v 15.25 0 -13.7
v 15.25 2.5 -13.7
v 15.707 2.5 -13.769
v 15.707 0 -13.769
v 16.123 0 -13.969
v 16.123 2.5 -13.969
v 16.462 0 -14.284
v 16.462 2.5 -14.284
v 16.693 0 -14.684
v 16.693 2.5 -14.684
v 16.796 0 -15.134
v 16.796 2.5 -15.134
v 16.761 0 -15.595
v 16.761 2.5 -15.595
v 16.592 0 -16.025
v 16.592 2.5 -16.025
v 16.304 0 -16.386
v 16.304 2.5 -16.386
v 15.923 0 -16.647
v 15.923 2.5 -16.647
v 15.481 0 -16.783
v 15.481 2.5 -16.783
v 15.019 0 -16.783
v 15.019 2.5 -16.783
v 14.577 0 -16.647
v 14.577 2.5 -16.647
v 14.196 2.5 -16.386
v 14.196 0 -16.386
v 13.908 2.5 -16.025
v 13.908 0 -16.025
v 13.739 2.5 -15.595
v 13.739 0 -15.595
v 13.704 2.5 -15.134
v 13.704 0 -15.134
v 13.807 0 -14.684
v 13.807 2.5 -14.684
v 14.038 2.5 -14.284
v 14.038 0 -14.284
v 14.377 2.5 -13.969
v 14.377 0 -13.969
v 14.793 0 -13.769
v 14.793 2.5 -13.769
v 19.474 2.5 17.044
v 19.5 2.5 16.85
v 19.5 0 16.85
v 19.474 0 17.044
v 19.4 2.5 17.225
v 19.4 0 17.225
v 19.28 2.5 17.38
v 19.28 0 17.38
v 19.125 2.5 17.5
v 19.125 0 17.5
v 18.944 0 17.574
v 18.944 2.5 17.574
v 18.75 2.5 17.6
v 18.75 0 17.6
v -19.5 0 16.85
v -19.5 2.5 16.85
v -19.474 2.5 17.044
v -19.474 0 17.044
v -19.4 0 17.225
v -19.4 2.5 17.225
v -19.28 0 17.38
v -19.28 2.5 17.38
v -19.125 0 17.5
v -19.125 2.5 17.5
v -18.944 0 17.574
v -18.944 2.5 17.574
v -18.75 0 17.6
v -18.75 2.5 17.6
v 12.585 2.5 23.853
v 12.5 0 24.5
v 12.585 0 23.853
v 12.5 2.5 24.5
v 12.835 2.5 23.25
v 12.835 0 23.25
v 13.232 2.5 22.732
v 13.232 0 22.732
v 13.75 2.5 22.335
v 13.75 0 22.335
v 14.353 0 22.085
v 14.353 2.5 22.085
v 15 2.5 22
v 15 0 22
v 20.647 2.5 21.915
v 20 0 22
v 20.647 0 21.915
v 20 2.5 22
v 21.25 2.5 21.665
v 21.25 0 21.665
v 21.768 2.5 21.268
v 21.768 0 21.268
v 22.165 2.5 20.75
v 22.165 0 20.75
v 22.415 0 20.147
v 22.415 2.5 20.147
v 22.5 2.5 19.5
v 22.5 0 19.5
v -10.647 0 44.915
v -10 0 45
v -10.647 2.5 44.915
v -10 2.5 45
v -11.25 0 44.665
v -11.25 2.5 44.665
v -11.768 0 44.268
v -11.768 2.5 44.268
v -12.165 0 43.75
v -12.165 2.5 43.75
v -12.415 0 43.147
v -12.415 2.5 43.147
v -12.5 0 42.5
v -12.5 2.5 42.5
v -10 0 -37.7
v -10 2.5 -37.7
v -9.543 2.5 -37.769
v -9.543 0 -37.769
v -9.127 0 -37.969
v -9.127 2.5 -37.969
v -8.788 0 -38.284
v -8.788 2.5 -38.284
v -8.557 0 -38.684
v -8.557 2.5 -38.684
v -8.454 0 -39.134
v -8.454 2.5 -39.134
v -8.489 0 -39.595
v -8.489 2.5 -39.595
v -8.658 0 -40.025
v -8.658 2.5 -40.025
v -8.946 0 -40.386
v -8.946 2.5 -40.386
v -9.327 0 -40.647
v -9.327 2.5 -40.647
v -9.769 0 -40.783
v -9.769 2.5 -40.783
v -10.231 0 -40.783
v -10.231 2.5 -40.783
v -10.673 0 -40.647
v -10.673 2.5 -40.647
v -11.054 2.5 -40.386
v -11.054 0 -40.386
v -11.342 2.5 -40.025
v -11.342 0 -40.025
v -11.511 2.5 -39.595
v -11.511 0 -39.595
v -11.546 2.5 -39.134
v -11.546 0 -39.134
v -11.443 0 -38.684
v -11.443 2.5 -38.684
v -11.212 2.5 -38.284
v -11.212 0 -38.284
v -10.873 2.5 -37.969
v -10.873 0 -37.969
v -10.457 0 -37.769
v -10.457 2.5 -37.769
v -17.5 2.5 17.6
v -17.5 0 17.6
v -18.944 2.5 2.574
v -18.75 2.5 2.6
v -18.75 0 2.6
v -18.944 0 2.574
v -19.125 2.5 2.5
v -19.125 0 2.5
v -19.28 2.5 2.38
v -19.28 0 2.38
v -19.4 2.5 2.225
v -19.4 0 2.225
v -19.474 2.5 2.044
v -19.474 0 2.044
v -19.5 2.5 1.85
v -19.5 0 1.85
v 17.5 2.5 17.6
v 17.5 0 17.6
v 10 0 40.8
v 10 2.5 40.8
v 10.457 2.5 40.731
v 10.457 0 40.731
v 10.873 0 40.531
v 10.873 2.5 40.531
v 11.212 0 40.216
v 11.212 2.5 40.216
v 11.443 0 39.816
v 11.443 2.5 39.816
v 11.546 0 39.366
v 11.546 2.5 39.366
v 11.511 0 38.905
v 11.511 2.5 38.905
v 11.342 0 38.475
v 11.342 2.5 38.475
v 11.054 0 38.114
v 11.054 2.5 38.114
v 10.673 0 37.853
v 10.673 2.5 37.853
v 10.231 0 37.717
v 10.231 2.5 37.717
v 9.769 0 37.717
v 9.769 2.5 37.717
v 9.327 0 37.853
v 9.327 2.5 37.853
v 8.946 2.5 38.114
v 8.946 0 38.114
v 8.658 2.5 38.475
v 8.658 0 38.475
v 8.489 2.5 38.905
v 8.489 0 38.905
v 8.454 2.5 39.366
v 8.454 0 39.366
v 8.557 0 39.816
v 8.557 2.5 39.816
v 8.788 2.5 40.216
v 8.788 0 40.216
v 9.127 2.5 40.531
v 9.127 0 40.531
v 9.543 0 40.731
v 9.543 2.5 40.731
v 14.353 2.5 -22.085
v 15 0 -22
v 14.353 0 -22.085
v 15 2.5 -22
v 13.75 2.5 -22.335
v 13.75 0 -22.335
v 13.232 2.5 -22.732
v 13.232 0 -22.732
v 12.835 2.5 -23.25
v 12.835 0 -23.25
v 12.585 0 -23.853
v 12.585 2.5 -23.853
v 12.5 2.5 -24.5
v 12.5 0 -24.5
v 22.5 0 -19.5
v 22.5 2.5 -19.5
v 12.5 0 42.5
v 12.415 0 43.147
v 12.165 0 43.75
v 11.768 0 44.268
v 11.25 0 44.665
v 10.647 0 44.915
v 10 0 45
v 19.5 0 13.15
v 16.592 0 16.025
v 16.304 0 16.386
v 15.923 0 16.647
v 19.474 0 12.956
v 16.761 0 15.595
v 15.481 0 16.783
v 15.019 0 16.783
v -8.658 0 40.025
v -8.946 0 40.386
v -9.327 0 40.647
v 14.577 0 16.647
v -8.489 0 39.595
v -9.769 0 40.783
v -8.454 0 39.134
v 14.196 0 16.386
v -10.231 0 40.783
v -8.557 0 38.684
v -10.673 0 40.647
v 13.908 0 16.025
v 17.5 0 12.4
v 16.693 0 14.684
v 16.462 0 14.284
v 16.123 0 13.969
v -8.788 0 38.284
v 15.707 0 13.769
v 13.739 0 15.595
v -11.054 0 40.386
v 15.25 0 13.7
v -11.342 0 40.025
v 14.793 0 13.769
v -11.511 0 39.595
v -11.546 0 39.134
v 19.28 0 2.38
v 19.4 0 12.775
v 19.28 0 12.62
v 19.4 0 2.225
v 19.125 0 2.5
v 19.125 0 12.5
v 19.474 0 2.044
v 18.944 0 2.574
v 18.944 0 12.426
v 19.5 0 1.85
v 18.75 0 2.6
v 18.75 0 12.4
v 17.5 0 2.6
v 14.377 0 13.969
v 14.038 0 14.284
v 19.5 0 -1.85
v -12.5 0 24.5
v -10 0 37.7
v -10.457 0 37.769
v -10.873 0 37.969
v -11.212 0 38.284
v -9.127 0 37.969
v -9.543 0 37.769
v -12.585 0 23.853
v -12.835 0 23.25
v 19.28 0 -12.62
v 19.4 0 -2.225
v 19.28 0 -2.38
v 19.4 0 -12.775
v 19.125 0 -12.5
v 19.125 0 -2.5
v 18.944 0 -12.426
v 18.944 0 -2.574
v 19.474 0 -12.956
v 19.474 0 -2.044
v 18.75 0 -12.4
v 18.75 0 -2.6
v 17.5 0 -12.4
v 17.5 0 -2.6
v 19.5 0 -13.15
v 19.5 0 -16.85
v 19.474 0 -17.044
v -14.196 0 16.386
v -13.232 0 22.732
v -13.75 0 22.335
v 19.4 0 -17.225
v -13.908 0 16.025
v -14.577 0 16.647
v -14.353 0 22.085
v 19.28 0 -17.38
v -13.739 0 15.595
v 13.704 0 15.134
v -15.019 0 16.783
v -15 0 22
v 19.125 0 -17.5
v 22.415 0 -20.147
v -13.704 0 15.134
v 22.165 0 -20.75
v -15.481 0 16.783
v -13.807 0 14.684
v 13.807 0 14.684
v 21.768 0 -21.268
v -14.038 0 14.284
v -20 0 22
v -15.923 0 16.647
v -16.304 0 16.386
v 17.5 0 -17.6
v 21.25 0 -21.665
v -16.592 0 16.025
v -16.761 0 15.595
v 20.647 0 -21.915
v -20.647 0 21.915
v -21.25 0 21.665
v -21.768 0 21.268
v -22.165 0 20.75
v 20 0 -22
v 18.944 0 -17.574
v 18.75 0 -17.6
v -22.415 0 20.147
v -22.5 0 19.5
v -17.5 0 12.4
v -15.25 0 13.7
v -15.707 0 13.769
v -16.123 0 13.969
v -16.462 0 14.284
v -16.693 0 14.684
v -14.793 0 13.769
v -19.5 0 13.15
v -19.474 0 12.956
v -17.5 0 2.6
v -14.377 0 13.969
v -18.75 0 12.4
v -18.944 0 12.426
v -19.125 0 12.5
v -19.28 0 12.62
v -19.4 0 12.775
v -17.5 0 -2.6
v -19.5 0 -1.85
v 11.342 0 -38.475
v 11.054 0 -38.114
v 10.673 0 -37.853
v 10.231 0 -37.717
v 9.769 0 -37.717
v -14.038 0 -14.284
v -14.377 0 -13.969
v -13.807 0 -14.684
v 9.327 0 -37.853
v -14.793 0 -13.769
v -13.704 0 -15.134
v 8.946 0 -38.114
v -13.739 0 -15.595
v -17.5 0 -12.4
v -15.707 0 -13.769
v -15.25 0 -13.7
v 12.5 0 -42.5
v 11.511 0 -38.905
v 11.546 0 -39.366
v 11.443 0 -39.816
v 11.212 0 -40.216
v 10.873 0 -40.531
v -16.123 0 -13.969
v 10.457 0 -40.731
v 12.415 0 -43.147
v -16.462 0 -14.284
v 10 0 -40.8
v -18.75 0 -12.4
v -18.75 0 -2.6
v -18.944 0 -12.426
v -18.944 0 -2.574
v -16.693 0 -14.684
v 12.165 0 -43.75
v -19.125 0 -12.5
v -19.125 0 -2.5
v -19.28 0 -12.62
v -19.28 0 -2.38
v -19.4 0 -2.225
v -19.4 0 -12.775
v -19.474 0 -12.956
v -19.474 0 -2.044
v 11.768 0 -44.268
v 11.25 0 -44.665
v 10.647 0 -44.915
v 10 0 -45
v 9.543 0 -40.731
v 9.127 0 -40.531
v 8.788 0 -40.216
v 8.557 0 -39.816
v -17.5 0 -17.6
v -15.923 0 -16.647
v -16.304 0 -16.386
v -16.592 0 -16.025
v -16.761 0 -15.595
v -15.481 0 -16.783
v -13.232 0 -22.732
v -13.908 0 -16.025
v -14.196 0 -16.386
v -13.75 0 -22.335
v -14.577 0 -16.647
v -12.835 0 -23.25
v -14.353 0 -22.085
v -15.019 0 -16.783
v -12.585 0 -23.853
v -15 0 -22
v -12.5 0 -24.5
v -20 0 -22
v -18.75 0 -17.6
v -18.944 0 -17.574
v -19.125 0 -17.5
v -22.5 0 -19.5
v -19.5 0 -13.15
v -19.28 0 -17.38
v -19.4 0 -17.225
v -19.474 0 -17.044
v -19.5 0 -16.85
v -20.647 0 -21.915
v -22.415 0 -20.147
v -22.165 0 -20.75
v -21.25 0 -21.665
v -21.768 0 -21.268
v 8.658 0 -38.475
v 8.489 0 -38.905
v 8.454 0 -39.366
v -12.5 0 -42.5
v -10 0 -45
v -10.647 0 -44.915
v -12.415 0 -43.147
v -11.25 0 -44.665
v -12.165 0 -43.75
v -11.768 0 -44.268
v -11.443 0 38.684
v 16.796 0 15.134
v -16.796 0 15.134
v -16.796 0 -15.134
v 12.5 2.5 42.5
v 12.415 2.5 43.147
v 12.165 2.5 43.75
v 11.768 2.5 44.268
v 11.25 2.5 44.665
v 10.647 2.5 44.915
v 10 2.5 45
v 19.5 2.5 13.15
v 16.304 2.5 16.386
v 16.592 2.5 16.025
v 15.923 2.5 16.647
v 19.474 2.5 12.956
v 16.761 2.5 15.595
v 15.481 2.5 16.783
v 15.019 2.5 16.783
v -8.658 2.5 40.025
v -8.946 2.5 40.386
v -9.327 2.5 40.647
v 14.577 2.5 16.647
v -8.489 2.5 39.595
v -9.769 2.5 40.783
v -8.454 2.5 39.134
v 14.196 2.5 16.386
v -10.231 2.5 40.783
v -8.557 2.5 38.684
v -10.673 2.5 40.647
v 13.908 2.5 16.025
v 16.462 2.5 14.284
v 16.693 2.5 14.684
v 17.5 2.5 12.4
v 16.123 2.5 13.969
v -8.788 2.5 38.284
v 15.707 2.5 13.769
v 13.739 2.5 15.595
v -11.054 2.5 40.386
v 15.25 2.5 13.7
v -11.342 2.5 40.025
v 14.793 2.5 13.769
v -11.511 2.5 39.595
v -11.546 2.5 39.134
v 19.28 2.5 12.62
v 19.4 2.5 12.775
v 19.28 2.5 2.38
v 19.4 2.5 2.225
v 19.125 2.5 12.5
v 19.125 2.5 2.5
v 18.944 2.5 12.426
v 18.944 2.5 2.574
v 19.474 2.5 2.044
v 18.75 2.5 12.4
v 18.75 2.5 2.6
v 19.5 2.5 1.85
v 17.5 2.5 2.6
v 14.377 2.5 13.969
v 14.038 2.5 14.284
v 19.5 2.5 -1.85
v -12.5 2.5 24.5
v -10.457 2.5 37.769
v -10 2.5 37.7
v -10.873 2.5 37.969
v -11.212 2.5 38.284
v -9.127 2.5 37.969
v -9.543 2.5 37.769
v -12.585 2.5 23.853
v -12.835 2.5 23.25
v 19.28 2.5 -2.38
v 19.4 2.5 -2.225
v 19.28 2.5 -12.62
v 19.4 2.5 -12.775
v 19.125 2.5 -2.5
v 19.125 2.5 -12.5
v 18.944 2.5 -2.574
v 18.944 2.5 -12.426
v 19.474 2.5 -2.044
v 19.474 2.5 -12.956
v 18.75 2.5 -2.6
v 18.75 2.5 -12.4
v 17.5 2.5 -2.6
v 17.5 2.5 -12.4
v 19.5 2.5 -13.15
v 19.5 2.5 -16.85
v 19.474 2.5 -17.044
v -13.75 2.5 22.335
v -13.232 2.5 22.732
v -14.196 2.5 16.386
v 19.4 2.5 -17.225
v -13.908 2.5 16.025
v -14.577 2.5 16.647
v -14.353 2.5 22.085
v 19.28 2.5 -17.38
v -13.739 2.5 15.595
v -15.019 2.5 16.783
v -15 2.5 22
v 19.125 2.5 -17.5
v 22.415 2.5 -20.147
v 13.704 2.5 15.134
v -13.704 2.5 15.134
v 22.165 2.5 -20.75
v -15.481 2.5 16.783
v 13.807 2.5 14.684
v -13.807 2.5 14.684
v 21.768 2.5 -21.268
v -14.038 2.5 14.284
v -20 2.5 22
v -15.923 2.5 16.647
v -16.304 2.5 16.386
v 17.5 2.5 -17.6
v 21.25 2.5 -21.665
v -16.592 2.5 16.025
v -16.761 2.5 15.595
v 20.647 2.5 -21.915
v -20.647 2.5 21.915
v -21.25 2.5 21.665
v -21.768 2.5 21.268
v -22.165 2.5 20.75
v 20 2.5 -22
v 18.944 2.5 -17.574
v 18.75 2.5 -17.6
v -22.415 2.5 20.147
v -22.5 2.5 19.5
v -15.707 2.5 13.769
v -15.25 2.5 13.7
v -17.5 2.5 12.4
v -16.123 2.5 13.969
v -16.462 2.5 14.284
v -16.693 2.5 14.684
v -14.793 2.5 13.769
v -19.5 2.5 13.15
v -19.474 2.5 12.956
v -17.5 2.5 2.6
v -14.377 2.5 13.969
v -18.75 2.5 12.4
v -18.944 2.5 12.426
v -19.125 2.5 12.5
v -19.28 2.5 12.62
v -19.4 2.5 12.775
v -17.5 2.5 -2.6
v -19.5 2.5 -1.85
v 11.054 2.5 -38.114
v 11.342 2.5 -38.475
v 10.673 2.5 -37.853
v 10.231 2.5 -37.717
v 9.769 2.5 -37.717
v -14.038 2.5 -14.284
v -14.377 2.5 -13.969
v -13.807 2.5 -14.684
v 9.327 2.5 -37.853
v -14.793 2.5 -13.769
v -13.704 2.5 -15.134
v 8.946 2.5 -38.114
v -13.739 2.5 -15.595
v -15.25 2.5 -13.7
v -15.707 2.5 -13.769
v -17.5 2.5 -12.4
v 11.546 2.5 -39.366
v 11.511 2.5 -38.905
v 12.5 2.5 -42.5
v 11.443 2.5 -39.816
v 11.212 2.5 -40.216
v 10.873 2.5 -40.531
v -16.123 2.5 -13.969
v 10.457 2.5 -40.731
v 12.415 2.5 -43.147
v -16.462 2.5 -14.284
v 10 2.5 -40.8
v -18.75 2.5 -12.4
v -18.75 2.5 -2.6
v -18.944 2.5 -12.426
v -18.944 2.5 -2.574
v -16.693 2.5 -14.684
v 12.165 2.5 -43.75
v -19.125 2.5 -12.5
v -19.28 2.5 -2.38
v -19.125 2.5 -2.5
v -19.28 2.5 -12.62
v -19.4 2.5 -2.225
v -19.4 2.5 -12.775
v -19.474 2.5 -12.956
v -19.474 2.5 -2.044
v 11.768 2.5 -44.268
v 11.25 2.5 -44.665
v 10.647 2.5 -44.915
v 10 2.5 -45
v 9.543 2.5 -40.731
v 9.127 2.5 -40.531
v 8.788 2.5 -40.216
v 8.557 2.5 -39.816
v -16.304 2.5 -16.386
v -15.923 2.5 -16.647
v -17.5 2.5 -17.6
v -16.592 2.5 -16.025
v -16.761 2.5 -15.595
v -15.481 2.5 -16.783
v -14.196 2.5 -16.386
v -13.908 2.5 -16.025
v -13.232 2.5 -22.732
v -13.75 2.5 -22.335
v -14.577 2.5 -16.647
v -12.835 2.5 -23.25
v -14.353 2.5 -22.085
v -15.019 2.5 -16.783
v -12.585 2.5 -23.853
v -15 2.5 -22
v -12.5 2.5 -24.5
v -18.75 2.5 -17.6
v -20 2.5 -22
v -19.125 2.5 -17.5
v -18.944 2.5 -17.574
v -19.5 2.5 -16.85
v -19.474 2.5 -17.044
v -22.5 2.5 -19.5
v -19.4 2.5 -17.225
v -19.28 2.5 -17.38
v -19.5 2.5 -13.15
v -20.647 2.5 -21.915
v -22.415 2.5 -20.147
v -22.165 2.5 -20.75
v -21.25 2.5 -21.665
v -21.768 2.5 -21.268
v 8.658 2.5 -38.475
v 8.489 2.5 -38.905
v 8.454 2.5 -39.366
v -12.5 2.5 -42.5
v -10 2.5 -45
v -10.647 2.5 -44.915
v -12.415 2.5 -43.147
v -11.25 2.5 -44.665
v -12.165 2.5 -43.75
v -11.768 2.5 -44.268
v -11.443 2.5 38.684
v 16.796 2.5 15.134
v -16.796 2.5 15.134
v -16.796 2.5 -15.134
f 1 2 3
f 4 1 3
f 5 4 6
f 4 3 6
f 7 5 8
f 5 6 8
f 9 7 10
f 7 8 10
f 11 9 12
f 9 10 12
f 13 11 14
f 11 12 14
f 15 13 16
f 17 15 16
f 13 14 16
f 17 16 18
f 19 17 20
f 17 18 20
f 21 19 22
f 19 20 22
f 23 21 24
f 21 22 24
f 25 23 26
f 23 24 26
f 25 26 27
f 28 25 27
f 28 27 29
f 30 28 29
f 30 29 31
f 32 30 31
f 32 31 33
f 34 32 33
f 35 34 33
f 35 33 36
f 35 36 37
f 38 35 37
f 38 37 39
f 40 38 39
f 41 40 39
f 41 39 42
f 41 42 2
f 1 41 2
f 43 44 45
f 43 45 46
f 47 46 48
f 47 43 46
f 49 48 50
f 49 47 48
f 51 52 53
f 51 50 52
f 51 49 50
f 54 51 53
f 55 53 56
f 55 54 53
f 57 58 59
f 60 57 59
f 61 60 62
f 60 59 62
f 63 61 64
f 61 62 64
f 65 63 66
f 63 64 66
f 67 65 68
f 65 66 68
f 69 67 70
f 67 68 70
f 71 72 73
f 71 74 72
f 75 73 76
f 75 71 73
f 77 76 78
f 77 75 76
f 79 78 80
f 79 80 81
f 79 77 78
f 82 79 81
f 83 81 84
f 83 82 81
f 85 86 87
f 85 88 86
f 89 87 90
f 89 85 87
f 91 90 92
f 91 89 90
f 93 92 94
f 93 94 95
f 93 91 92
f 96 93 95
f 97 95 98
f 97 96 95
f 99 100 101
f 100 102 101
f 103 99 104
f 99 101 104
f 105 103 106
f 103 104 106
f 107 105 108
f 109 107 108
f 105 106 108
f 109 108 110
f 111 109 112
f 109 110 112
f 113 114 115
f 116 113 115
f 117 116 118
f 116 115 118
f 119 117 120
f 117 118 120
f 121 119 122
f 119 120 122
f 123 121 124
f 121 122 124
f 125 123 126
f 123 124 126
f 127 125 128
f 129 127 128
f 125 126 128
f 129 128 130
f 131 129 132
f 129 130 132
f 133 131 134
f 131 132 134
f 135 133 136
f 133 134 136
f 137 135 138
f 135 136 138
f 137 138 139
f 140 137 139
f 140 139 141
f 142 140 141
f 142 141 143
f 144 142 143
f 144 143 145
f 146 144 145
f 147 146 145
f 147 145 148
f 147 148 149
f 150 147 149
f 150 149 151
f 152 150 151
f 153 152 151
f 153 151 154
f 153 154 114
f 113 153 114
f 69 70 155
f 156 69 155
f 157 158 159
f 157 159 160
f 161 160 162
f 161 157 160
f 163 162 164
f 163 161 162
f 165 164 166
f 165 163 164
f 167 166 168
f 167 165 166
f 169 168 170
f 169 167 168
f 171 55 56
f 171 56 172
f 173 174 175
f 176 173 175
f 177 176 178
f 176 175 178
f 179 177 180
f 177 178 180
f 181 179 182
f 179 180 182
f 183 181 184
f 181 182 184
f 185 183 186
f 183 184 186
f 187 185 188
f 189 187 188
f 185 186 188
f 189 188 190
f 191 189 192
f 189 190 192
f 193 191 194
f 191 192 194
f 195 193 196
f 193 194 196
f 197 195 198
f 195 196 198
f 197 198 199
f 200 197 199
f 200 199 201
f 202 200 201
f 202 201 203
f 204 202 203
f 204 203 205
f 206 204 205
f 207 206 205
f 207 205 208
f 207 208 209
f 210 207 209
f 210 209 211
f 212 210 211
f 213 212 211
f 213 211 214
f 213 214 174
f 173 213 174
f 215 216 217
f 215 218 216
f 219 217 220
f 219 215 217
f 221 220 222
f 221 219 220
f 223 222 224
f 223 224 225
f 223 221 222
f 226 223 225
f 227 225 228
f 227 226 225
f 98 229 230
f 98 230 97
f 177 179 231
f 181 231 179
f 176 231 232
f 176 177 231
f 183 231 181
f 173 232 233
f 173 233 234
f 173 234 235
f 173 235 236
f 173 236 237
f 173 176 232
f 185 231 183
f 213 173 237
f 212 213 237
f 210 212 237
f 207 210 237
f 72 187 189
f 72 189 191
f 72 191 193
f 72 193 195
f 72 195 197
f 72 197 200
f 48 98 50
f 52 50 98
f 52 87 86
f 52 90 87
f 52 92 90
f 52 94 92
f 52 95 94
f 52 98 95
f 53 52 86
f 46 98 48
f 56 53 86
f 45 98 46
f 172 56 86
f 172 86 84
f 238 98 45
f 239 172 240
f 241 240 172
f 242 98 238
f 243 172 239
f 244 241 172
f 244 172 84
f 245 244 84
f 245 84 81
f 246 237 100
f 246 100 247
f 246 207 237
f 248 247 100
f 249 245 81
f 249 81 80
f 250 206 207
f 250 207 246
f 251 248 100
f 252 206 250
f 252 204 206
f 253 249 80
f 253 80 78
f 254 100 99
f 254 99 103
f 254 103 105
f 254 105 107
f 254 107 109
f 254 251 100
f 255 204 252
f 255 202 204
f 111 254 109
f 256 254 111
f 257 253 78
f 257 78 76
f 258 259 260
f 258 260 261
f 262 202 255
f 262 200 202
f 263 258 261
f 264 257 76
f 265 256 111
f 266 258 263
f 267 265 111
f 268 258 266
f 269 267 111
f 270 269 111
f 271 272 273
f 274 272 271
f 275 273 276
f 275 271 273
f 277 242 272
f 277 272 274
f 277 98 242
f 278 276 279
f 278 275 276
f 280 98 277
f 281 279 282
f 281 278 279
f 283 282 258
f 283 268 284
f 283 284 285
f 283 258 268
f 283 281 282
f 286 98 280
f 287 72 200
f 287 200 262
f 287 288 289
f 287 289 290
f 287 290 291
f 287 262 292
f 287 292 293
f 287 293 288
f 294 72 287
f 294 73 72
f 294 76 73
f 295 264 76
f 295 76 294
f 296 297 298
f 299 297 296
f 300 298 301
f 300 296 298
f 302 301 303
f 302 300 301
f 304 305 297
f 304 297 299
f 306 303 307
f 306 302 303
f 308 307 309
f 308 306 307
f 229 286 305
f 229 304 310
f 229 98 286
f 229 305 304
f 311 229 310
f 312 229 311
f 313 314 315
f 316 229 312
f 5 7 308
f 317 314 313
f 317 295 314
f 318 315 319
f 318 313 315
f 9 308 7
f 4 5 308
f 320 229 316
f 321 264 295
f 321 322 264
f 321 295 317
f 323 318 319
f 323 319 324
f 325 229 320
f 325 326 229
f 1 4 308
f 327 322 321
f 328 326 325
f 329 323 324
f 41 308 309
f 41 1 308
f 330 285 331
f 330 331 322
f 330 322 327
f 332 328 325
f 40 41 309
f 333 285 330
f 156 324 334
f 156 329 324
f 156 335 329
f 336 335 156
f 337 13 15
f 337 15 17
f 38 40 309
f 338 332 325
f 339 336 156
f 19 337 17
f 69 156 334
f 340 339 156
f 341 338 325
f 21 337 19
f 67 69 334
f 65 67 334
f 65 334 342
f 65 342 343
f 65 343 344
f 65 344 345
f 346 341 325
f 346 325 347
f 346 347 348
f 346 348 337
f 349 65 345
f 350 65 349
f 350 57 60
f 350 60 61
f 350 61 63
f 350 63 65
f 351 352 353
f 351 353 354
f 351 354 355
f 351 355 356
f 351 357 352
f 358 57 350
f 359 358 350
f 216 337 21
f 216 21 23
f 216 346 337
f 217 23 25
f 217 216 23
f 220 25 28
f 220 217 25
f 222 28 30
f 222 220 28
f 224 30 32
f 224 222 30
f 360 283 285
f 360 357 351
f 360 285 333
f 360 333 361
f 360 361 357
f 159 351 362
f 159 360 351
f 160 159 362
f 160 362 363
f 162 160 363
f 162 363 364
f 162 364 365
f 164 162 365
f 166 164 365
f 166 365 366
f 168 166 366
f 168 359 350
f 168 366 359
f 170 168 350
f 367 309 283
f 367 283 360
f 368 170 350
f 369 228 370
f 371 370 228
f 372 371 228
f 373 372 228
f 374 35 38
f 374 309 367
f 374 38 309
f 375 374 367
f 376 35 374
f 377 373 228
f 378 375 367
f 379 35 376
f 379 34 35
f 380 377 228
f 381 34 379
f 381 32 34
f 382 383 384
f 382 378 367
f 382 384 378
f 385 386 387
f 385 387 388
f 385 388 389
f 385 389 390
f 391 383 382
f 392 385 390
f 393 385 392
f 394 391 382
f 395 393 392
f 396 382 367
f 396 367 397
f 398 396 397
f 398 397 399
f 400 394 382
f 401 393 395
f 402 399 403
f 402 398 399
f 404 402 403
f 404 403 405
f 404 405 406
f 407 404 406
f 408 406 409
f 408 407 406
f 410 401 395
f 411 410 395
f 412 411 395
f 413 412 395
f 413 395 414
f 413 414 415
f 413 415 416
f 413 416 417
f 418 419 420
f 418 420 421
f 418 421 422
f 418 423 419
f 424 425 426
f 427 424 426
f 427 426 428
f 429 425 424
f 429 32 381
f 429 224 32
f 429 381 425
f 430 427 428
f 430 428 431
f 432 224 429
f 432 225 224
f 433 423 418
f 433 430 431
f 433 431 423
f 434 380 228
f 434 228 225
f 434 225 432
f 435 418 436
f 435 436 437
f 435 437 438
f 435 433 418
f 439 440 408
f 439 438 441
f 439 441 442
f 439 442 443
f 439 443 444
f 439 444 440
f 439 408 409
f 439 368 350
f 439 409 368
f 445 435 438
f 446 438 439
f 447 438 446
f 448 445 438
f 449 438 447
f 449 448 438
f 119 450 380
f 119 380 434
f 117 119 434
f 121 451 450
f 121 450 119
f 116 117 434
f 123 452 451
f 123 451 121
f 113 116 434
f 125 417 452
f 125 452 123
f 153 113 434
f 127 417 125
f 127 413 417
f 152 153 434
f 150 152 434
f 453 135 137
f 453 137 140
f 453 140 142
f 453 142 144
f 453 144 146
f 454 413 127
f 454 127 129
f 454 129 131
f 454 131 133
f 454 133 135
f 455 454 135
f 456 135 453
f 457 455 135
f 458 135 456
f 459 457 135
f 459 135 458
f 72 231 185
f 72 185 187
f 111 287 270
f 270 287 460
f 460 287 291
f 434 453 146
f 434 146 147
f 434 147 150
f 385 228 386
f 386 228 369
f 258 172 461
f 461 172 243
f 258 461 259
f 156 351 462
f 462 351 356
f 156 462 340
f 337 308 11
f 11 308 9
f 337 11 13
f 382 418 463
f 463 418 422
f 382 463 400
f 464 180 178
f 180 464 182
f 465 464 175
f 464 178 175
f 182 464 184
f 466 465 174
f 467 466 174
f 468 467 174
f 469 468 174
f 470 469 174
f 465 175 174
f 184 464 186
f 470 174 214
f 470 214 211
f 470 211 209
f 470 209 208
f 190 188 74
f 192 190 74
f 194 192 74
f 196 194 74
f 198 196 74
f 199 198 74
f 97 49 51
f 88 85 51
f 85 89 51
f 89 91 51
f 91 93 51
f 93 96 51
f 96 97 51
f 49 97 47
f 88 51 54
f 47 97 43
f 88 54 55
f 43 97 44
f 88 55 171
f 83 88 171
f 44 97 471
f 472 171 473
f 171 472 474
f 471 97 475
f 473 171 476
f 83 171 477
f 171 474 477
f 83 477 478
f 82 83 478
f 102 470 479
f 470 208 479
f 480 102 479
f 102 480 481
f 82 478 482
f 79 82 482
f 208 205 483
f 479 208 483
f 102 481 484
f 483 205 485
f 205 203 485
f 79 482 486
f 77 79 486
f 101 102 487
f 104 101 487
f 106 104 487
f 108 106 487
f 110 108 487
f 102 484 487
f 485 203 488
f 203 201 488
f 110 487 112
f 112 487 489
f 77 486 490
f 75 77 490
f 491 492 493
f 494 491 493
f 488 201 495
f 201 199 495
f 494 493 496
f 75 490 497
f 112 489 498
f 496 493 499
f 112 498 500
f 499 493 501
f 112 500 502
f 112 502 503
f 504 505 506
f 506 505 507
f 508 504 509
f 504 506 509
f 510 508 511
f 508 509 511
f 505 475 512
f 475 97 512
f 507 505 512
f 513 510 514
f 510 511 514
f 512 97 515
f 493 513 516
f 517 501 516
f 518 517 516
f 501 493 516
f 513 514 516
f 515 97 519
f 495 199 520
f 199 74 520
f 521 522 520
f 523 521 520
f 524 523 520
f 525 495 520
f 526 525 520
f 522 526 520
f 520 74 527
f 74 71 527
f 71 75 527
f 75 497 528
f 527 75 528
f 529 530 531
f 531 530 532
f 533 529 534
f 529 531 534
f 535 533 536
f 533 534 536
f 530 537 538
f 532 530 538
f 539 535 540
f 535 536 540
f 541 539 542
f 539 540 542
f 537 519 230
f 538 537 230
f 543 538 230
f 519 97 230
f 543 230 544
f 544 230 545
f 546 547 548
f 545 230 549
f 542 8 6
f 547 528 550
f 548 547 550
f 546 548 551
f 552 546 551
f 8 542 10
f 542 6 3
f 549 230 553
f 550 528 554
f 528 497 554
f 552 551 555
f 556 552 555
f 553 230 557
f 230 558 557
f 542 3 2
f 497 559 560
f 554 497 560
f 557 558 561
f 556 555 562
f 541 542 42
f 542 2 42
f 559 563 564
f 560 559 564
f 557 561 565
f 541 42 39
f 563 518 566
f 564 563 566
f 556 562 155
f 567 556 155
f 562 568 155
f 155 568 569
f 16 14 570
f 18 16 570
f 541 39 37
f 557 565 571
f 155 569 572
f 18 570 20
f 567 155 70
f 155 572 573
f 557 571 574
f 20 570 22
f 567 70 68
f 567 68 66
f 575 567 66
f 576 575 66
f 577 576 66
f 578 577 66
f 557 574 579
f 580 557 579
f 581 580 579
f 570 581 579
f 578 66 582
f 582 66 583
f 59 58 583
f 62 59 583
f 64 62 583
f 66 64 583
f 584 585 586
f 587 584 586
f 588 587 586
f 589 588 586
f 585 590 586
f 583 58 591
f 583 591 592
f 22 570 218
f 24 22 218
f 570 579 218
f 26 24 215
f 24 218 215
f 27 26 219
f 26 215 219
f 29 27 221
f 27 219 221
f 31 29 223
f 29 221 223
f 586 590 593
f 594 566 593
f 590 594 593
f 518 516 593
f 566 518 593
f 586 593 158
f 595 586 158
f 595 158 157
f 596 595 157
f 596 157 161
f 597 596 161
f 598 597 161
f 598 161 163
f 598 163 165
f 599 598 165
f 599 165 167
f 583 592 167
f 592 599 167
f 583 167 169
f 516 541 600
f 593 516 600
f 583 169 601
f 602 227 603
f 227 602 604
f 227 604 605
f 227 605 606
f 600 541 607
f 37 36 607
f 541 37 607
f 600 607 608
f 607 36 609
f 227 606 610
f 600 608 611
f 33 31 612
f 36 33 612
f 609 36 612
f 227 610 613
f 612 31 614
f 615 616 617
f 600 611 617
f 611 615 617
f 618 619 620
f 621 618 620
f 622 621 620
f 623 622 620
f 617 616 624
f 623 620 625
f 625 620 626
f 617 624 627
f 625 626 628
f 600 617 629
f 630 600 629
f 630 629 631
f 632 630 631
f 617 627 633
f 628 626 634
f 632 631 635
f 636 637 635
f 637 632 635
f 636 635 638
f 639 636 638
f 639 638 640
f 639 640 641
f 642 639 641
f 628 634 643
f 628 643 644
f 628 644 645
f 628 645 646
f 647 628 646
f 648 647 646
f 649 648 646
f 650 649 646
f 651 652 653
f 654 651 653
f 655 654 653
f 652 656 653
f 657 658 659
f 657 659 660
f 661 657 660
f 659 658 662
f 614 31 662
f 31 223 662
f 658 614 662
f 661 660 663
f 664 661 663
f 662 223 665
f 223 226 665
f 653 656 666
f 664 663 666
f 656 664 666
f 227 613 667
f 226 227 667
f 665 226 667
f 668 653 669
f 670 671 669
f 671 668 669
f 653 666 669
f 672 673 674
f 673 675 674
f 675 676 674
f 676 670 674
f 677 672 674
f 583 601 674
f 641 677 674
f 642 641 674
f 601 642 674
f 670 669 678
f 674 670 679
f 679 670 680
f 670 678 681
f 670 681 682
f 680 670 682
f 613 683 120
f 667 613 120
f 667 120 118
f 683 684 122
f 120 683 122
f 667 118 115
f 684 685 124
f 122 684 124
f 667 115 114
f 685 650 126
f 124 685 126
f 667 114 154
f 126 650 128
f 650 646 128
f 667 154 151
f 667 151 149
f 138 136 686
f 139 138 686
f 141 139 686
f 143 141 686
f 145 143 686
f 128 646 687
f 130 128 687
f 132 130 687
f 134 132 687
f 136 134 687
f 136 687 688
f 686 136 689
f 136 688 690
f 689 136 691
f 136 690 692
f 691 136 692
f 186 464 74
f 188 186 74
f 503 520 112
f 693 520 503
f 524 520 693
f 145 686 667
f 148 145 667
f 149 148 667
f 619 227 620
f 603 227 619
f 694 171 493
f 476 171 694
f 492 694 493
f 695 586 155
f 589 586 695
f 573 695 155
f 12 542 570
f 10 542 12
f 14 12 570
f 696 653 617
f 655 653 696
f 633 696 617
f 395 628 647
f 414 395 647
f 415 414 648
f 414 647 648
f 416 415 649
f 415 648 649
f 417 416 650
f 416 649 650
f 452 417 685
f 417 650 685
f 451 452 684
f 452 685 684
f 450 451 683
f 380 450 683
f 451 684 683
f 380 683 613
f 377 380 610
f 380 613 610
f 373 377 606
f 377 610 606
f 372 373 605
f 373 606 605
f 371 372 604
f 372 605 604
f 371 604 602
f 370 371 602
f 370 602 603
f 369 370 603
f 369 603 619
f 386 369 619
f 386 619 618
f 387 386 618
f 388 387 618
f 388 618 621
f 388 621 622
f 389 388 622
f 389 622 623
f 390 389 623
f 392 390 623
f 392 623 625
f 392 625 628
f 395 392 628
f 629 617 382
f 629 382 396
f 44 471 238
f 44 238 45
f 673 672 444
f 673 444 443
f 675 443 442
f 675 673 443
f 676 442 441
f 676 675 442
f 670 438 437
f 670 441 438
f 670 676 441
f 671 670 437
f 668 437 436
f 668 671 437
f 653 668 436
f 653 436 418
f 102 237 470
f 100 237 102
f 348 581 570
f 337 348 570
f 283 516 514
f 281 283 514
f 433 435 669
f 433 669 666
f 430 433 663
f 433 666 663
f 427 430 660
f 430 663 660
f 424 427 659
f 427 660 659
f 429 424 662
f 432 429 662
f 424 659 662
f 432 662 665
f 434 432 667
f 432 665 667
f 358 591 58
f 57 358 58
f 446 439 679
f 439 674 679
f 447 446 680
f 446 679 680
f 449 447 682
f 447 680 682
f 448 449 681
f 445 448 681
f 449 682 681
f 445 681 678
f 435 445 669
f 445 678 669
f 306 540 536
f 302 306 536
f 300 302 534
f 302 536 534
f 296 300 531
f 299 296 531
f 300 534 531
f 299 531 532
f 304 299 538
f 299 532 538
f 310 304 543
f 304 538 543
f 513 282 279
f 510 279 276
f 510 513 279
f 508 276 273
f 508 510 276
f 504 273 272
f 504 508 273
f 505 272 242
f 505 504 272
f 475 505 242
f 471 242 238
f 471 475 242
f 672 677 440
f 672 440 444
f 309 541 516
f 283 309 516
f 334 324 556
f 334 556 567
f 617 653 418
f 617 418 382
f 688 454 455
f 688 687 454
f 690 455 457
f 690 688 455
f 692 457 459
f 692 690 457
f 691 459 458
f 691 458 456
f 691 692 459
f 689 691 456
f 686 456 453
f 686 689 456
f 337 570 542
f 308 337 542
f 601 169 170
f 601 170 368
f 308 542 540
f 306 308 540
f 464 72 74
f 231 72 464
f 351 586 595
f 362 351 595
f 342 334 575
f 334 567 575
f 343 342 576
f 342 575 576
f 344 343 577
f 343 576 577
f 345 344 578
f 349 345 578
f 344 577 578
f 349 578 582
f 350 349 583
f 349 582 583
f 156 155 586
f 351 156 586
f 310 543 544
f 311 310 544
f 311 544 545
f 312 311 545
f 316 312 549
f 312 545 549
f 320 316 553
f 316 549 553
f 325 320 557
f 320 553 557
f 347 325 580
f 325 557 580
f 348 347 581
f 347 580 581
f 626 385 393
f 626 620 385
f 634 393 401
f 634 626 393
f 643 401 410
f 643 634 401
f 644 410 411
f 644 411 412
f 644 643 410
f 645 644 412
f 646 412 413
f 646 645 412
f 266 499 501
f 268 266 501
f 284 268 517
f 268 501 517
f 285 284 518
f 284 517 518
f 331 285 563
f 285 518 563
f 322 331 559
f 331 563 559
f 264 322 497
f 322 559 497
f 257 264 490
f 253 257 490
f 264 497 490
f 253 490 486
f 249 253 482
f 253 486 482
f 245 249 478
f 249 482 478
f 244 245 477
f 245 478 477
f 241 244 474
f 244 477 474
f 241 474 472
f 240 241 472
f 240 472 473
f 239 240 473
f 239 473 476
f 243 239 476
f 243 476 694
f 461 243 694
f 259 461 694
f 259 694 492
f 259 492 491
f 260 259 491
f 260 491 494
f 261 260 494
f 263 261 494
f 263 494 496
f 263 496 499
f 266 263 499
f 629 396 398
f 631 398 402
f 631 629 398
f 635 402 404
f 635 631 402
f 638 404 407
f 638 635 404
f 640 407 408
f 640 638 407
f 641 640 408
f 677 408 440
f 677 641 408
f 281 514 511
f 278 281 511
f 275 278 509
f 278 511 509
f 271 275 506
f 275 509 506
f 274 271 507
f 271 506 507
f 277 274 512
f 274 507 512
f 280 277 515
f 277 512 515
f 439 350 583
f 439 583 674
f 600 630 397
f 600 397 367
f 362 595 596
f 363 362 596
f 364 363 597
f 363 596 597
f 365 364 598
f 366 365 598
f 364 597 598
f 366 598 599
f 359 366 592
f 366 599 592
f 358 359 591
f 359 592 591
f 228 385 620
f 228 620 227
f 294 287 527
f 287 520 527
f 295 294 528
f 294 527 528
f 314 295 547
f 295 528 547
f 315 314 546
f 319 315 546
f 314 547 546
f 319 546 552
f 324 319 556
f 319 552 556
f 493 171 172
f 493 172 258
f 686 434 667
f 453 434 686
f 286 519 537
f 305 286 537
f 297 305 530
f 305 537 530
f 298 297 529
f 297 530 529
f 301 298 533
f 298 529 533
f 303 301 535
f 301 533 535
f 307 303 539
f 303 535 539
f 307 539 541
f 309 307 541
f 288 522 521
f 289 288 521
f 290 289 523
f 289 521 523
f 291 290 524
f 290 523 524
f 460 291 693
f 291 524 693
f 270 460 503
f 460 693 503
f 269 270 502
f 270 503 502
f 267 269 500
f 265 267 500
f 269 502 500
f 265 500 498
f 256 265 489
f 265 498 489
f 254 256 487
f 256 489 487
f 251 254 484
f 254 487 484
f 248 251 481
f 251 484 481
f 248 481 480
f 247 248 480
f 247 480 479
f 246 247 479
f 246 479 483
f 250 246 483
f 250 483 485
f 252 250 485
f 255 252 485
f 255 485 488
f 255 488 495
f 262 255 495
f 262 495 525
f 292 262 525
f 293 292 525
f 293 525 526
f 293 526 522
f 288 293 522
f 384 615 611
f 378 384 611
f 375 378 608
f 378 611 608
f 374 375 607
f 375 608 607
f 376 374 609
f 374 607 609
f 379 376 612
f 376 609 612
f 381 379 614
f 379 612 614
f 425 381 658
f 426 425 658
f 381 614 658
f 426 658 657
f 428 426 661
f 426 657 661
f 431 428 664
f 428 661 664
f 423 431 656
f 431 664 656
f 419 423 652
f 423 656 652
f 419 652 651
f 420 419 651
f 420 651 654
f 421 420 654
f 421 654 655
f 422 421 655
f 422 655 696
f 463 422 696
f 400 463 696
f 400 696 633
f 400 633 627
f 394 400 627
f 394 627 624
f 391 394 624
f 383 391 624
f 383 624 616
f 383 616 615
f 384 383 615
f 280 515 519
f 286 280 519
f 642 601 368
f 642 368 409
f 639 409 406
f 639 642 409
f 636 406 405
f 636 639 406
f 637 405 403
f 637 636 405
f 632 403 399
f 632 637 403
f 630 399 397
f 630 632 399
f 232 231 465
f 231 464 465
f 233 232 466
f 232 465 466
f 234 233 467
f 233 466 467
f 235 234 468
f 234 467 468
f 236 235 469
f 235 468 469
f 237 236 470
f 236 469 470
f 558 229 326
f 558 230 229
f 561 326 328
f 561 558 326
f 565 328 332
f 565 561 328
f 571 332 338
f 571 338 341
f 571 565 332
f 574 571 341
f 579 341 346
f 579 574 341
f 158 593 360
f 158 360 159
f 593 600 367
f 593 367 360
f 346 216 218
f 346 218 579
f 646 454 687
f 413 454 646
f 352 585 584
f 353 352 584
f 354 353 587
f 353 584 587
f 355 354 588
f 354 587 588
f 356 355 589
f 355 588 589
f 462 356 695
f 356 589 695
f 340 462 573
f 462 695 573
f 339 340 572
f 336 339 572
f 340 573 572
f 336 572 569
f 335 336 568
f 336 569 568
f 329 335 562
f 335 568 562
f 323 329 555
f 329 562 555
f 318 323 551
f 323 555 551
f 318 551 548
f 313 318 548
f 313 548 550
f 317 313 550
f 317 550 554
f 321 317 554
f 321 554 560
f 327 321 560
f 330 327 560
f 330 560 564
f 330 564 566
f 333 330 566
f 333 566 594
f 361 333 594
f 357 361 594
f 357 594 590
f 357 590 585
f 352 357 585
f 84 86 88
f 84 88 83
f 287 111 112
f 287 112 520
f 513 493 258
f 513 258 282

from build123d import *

# Parameters (mm, degrees)
BOSS_EXTRUDE1_DEPTH = 2.5
SKETCH2_R           = 1.55
CUT_EXTRUDE1_DEPTH  = 51.373604199
CUT_EXTRUDE2_DEPTH  = 51.373604199
FILLET2_R           = 2.5
FILLET3_R           = 2.5


with BuildPart() as part:
    # Sketch1 → Boss-Extrude1 (new body)
    with BuildSketch(Plane(origin=(0, 0, 0), x_dir=(1, 0, 0), z_dir=(0, 1, 0))):
        Polygon((12.5, -45), (-12.5, -45), (-12.5, -22), (-22.5, -22), (-22.5, 22), (-12.5, 22), (-12.5, 45), (12.5, 45), (12.5, 22), (22.5, 22), (22.5, -22), (12.5, -22), align=None)
    extrude(amount=BOSS_EXTRUDE1_DEPTH)

    # Sketch2 → Cut-Extrude1 (cut, through all)
    with BuildSketch(Plane(origin=(0, 2.5, 0), x_dir=(1, 0, 0), z_dir=(0, 1, 0))):
        with Locations(Location((-15.25, 15.25, 0), (0, 0, 270))):
            Circle(SKETCH2_R)
        with Locations(Location((15.25, 15.25, 0), (0, 0, 270))):
            Circle(SKETCH2_R)
        with Locations(Location((15.25, -15.25, 0), (0, 0, 90))):
            Circle(SKETCH2_R)
        with Locations(Location((-15.25, -15.25, 0), (0, 0, 90))):
            Circle(SKETCH2_R)
        with Locations(Location((-10, 39.25, 0), (0, 0, 270))):
            Circle(SKETCH2_R)
        with Locations(Location((-10, -39.25, 0), (0, 0, 90))):
            Circle(SKETCH2_R)
        with Locations(Location((10, -39.25, 0), (0, 0, 270))):
            Circle(SKETCH2_R)
        with Locations(Location((10, 39.25, 0), (0, 0, 90))):
            Circle(SKETCH2_R)
    extrude(amount=-CUT_EXTRUDE1_DEPTH, mode=Mode.SUBTRACT)

    # Sketch3 → Cut-Extrude2 (cut, through all)
    with BuildSketch(Plane(origin=(0, 2.5, 0), x_dir=(1, 0, 0), z_dir=(0, 1, 0))):
        with BuildLine():
            Line((-17.5, -2.6), (-18.75, -2.6))
            ThreePointArc((-18.75, -2.6), (-19.280330086, -2.380330086), (-19.5, -1.85))
            Line((-19.5, -1.85), (-19.5, 1.85))
            ThreePointArc((-19.5, 1.85), (-19.280330086, 2.380330086), (-18.75, 2.6))
            Line((-18.75, 2.6), (-17.5, 2.6))
            Line((-17.5, 2.6), (-17.5, -2.6))
        make_face()
        with BuildLine():
            Line((-17.5, 12.4), (-18.75, 12.4))
            ThreePointArc((-18.75, 12.4), (-19.280330086, 12.619669914), (-19.5, 13.15))
            Line((-19.5, 13.15), (-19.5, 16.85))
            ThreePointArc((-19.5, 16.85), (-19.280330086, 17.380330086), (-18.75, 17.6))
            Line((-18.75, 17.6), (-17.5, 17.6))
            Line((-17.5, 17.6), (-17.5, 12.4))
        make_face()
        with BuildLine():
            Line((-17.5, 27.4), (-18.75, 27.4))
            ThreePointArc((-18.75, 27.4), (-19.280330086, 27.619669914), (-19.5, 28.15))
            Line((-19.5, 28.15), (-19.5, 31.85))
            ThreePointArc((-19.5, 31.85), (-19.280330086, 32.380330086), (-18.75, 32.6))
            Line((-18.75, 32.6), (-17.5, 32.6))
            Line((-17.5, 32.6), (-17.5, 27.4))
        make_face()
        with BuildLine():
            Line((19.5, 28.15), (19.5, 31.85))
            ThreePointArc((19.5, 31.85), (19.280330086, 32.380330086), (18.75, 32.6))
            Line((18.75, 32.6), (17.5, 32.6))
            Line((17.5, 32.6), (17.5, 27.4))
            Line((17.5, 27.4), (18.75, 27.4))
            ThreePointArc((18.75, 27.4), (19.280330086, 27.619669914), (19.5, 28.15))
        make_face()
        with BuildLine():
            Line((19.5, 13.15), (19.5, 16.85))
            ThreePointArc((19.5, 16.85), (19.280330086, 17.380330086), (18.75, 17.6))
            Line((18.75, 17.6), (17.5, 17.6))
            Line((17.5, 17.6), (17.5, 12.4))
            Line((17.5, 12.4), (18.75, 12.4))
            ThreePointArc((18.75, 12.4), (19.280330086, 12.619669914), (19.5, 13.15))
        make_face()
        with BuildLine():
            Line((19.5, -1.85), (19.5, 1.85))
            ThreePointArc((19.5, 1.85), (19.280330086, 2.380330086), (18.75, 2.6))
            Line((18.75, 2.6), (17.5, 2.6))
            Line((17.5, 2.6), (17.5, -2.6))
            Line((17.5, -2.6), (18.75, -2.6))
            ThreePointArc((18.75, -2.6), (19.280330086, -2.380330086), (19.5, -1.85))
        make_face()
        with BuildLine():
            Line((17.5, -12.4), (18.75, -12.4))
            ThreePointArc((18.75, -12.4), (19.280330086, -12.619669914), (19.5, -13.15))
            Line((19.5, -13.15), (19.5, -16.85))
            ThreePointArc((19.5, -16.85), (19.280330086, -17.380330086), (18.75, -17.6))
            Line((18.75, -17.6), (17.5, -17.6))
            Line((17.5, -17.6), (17.5, -12.4))
        make_face()
        with BuildLine():
            Line((17.5, -27.4), (18.75, -27.4))
            ThreePointArc((18.75, -27.4), (19.280330086, -27.619669914), (19.5, -28.15))
            Line((19.5, -28.15), (19.5, -31.85))
            ThreePointArc((19.5, -31.85), (19.280330086, -32.380330086), (18.75, -32.6))
            Line((18.75, -32.6), (17.5, -32.6))
            Line((17.5, -32.6), (17.5, -27.4))
        make_face()
        with BuildLine():
            Line((-19.5, -28.15), (-19.5, -31.85))
            ThreePointArc((-19.5, -31.85), (-19.280330086, -32.380330086), (-18.75, -32.6))
            Line((-18.75, -32.6), (-17.5, -32.6))
            Line((-17.5, -32.6), (-17.5, -27.4))
            Line((-17.5, -27.4), (-18.75, -27.4))
            ThreePointArc((-18.75, -27.4), (-19.280330086, -27.619669914), (-19.5, -28.15))
        make_face()
        with BuildLine():
            Line((-19.5, -13.15), (-19.5, -16.85))
            ThreePointArc((-19.5, -16.85), (-19.280330086, -17.380330086), (-18.75, -17.6))
            Line((-18.75, -17.6), (-17.5, -17.6))
            Line((-17.5, -17.6), (-17.5, -12.4))
            Line((-17.5, -12.4), (-18.75, -12.4))
            ThreePointArc((-18.75, -12.4), (-19.280330086, -12.619669914), (-19.5, -13.15))
        make_face()
    extrude(amount=-CUT_EXTRUDE2_DEPTH, mode=Mode.SUBTRACT)

    # Fillet2
    fillet2_edges = [part.edges().sort_by_distance(p)[0] for p in [
        (-12.5, 1.25, 22),
        (-22.5, 1.25, 22),
        (-22.5, 1.25, -22),
        (-12.5, 1.25, -22),
        (12.5, 1.25, -22),
        (22.5, 1.25, -22),
        (22.5, 1.25, 22),
        (12.5, 1.25, 22),
    ]]
    fillet(fillet2_edges, radius=FILLET2_R)

    # Fillet3
    fillet3_edges = [part.edges().sort_by_distance(p)[0] for p in [
        (12.5, 1.25, 45),
        (-12.5, 1.25, 45),
        (-12.5, 1.25, -45),
        (12.5, 1.25, -45),
    ]]
    fillet(fillet3_edges, radius=FILLET3_R)


solid = part.part
